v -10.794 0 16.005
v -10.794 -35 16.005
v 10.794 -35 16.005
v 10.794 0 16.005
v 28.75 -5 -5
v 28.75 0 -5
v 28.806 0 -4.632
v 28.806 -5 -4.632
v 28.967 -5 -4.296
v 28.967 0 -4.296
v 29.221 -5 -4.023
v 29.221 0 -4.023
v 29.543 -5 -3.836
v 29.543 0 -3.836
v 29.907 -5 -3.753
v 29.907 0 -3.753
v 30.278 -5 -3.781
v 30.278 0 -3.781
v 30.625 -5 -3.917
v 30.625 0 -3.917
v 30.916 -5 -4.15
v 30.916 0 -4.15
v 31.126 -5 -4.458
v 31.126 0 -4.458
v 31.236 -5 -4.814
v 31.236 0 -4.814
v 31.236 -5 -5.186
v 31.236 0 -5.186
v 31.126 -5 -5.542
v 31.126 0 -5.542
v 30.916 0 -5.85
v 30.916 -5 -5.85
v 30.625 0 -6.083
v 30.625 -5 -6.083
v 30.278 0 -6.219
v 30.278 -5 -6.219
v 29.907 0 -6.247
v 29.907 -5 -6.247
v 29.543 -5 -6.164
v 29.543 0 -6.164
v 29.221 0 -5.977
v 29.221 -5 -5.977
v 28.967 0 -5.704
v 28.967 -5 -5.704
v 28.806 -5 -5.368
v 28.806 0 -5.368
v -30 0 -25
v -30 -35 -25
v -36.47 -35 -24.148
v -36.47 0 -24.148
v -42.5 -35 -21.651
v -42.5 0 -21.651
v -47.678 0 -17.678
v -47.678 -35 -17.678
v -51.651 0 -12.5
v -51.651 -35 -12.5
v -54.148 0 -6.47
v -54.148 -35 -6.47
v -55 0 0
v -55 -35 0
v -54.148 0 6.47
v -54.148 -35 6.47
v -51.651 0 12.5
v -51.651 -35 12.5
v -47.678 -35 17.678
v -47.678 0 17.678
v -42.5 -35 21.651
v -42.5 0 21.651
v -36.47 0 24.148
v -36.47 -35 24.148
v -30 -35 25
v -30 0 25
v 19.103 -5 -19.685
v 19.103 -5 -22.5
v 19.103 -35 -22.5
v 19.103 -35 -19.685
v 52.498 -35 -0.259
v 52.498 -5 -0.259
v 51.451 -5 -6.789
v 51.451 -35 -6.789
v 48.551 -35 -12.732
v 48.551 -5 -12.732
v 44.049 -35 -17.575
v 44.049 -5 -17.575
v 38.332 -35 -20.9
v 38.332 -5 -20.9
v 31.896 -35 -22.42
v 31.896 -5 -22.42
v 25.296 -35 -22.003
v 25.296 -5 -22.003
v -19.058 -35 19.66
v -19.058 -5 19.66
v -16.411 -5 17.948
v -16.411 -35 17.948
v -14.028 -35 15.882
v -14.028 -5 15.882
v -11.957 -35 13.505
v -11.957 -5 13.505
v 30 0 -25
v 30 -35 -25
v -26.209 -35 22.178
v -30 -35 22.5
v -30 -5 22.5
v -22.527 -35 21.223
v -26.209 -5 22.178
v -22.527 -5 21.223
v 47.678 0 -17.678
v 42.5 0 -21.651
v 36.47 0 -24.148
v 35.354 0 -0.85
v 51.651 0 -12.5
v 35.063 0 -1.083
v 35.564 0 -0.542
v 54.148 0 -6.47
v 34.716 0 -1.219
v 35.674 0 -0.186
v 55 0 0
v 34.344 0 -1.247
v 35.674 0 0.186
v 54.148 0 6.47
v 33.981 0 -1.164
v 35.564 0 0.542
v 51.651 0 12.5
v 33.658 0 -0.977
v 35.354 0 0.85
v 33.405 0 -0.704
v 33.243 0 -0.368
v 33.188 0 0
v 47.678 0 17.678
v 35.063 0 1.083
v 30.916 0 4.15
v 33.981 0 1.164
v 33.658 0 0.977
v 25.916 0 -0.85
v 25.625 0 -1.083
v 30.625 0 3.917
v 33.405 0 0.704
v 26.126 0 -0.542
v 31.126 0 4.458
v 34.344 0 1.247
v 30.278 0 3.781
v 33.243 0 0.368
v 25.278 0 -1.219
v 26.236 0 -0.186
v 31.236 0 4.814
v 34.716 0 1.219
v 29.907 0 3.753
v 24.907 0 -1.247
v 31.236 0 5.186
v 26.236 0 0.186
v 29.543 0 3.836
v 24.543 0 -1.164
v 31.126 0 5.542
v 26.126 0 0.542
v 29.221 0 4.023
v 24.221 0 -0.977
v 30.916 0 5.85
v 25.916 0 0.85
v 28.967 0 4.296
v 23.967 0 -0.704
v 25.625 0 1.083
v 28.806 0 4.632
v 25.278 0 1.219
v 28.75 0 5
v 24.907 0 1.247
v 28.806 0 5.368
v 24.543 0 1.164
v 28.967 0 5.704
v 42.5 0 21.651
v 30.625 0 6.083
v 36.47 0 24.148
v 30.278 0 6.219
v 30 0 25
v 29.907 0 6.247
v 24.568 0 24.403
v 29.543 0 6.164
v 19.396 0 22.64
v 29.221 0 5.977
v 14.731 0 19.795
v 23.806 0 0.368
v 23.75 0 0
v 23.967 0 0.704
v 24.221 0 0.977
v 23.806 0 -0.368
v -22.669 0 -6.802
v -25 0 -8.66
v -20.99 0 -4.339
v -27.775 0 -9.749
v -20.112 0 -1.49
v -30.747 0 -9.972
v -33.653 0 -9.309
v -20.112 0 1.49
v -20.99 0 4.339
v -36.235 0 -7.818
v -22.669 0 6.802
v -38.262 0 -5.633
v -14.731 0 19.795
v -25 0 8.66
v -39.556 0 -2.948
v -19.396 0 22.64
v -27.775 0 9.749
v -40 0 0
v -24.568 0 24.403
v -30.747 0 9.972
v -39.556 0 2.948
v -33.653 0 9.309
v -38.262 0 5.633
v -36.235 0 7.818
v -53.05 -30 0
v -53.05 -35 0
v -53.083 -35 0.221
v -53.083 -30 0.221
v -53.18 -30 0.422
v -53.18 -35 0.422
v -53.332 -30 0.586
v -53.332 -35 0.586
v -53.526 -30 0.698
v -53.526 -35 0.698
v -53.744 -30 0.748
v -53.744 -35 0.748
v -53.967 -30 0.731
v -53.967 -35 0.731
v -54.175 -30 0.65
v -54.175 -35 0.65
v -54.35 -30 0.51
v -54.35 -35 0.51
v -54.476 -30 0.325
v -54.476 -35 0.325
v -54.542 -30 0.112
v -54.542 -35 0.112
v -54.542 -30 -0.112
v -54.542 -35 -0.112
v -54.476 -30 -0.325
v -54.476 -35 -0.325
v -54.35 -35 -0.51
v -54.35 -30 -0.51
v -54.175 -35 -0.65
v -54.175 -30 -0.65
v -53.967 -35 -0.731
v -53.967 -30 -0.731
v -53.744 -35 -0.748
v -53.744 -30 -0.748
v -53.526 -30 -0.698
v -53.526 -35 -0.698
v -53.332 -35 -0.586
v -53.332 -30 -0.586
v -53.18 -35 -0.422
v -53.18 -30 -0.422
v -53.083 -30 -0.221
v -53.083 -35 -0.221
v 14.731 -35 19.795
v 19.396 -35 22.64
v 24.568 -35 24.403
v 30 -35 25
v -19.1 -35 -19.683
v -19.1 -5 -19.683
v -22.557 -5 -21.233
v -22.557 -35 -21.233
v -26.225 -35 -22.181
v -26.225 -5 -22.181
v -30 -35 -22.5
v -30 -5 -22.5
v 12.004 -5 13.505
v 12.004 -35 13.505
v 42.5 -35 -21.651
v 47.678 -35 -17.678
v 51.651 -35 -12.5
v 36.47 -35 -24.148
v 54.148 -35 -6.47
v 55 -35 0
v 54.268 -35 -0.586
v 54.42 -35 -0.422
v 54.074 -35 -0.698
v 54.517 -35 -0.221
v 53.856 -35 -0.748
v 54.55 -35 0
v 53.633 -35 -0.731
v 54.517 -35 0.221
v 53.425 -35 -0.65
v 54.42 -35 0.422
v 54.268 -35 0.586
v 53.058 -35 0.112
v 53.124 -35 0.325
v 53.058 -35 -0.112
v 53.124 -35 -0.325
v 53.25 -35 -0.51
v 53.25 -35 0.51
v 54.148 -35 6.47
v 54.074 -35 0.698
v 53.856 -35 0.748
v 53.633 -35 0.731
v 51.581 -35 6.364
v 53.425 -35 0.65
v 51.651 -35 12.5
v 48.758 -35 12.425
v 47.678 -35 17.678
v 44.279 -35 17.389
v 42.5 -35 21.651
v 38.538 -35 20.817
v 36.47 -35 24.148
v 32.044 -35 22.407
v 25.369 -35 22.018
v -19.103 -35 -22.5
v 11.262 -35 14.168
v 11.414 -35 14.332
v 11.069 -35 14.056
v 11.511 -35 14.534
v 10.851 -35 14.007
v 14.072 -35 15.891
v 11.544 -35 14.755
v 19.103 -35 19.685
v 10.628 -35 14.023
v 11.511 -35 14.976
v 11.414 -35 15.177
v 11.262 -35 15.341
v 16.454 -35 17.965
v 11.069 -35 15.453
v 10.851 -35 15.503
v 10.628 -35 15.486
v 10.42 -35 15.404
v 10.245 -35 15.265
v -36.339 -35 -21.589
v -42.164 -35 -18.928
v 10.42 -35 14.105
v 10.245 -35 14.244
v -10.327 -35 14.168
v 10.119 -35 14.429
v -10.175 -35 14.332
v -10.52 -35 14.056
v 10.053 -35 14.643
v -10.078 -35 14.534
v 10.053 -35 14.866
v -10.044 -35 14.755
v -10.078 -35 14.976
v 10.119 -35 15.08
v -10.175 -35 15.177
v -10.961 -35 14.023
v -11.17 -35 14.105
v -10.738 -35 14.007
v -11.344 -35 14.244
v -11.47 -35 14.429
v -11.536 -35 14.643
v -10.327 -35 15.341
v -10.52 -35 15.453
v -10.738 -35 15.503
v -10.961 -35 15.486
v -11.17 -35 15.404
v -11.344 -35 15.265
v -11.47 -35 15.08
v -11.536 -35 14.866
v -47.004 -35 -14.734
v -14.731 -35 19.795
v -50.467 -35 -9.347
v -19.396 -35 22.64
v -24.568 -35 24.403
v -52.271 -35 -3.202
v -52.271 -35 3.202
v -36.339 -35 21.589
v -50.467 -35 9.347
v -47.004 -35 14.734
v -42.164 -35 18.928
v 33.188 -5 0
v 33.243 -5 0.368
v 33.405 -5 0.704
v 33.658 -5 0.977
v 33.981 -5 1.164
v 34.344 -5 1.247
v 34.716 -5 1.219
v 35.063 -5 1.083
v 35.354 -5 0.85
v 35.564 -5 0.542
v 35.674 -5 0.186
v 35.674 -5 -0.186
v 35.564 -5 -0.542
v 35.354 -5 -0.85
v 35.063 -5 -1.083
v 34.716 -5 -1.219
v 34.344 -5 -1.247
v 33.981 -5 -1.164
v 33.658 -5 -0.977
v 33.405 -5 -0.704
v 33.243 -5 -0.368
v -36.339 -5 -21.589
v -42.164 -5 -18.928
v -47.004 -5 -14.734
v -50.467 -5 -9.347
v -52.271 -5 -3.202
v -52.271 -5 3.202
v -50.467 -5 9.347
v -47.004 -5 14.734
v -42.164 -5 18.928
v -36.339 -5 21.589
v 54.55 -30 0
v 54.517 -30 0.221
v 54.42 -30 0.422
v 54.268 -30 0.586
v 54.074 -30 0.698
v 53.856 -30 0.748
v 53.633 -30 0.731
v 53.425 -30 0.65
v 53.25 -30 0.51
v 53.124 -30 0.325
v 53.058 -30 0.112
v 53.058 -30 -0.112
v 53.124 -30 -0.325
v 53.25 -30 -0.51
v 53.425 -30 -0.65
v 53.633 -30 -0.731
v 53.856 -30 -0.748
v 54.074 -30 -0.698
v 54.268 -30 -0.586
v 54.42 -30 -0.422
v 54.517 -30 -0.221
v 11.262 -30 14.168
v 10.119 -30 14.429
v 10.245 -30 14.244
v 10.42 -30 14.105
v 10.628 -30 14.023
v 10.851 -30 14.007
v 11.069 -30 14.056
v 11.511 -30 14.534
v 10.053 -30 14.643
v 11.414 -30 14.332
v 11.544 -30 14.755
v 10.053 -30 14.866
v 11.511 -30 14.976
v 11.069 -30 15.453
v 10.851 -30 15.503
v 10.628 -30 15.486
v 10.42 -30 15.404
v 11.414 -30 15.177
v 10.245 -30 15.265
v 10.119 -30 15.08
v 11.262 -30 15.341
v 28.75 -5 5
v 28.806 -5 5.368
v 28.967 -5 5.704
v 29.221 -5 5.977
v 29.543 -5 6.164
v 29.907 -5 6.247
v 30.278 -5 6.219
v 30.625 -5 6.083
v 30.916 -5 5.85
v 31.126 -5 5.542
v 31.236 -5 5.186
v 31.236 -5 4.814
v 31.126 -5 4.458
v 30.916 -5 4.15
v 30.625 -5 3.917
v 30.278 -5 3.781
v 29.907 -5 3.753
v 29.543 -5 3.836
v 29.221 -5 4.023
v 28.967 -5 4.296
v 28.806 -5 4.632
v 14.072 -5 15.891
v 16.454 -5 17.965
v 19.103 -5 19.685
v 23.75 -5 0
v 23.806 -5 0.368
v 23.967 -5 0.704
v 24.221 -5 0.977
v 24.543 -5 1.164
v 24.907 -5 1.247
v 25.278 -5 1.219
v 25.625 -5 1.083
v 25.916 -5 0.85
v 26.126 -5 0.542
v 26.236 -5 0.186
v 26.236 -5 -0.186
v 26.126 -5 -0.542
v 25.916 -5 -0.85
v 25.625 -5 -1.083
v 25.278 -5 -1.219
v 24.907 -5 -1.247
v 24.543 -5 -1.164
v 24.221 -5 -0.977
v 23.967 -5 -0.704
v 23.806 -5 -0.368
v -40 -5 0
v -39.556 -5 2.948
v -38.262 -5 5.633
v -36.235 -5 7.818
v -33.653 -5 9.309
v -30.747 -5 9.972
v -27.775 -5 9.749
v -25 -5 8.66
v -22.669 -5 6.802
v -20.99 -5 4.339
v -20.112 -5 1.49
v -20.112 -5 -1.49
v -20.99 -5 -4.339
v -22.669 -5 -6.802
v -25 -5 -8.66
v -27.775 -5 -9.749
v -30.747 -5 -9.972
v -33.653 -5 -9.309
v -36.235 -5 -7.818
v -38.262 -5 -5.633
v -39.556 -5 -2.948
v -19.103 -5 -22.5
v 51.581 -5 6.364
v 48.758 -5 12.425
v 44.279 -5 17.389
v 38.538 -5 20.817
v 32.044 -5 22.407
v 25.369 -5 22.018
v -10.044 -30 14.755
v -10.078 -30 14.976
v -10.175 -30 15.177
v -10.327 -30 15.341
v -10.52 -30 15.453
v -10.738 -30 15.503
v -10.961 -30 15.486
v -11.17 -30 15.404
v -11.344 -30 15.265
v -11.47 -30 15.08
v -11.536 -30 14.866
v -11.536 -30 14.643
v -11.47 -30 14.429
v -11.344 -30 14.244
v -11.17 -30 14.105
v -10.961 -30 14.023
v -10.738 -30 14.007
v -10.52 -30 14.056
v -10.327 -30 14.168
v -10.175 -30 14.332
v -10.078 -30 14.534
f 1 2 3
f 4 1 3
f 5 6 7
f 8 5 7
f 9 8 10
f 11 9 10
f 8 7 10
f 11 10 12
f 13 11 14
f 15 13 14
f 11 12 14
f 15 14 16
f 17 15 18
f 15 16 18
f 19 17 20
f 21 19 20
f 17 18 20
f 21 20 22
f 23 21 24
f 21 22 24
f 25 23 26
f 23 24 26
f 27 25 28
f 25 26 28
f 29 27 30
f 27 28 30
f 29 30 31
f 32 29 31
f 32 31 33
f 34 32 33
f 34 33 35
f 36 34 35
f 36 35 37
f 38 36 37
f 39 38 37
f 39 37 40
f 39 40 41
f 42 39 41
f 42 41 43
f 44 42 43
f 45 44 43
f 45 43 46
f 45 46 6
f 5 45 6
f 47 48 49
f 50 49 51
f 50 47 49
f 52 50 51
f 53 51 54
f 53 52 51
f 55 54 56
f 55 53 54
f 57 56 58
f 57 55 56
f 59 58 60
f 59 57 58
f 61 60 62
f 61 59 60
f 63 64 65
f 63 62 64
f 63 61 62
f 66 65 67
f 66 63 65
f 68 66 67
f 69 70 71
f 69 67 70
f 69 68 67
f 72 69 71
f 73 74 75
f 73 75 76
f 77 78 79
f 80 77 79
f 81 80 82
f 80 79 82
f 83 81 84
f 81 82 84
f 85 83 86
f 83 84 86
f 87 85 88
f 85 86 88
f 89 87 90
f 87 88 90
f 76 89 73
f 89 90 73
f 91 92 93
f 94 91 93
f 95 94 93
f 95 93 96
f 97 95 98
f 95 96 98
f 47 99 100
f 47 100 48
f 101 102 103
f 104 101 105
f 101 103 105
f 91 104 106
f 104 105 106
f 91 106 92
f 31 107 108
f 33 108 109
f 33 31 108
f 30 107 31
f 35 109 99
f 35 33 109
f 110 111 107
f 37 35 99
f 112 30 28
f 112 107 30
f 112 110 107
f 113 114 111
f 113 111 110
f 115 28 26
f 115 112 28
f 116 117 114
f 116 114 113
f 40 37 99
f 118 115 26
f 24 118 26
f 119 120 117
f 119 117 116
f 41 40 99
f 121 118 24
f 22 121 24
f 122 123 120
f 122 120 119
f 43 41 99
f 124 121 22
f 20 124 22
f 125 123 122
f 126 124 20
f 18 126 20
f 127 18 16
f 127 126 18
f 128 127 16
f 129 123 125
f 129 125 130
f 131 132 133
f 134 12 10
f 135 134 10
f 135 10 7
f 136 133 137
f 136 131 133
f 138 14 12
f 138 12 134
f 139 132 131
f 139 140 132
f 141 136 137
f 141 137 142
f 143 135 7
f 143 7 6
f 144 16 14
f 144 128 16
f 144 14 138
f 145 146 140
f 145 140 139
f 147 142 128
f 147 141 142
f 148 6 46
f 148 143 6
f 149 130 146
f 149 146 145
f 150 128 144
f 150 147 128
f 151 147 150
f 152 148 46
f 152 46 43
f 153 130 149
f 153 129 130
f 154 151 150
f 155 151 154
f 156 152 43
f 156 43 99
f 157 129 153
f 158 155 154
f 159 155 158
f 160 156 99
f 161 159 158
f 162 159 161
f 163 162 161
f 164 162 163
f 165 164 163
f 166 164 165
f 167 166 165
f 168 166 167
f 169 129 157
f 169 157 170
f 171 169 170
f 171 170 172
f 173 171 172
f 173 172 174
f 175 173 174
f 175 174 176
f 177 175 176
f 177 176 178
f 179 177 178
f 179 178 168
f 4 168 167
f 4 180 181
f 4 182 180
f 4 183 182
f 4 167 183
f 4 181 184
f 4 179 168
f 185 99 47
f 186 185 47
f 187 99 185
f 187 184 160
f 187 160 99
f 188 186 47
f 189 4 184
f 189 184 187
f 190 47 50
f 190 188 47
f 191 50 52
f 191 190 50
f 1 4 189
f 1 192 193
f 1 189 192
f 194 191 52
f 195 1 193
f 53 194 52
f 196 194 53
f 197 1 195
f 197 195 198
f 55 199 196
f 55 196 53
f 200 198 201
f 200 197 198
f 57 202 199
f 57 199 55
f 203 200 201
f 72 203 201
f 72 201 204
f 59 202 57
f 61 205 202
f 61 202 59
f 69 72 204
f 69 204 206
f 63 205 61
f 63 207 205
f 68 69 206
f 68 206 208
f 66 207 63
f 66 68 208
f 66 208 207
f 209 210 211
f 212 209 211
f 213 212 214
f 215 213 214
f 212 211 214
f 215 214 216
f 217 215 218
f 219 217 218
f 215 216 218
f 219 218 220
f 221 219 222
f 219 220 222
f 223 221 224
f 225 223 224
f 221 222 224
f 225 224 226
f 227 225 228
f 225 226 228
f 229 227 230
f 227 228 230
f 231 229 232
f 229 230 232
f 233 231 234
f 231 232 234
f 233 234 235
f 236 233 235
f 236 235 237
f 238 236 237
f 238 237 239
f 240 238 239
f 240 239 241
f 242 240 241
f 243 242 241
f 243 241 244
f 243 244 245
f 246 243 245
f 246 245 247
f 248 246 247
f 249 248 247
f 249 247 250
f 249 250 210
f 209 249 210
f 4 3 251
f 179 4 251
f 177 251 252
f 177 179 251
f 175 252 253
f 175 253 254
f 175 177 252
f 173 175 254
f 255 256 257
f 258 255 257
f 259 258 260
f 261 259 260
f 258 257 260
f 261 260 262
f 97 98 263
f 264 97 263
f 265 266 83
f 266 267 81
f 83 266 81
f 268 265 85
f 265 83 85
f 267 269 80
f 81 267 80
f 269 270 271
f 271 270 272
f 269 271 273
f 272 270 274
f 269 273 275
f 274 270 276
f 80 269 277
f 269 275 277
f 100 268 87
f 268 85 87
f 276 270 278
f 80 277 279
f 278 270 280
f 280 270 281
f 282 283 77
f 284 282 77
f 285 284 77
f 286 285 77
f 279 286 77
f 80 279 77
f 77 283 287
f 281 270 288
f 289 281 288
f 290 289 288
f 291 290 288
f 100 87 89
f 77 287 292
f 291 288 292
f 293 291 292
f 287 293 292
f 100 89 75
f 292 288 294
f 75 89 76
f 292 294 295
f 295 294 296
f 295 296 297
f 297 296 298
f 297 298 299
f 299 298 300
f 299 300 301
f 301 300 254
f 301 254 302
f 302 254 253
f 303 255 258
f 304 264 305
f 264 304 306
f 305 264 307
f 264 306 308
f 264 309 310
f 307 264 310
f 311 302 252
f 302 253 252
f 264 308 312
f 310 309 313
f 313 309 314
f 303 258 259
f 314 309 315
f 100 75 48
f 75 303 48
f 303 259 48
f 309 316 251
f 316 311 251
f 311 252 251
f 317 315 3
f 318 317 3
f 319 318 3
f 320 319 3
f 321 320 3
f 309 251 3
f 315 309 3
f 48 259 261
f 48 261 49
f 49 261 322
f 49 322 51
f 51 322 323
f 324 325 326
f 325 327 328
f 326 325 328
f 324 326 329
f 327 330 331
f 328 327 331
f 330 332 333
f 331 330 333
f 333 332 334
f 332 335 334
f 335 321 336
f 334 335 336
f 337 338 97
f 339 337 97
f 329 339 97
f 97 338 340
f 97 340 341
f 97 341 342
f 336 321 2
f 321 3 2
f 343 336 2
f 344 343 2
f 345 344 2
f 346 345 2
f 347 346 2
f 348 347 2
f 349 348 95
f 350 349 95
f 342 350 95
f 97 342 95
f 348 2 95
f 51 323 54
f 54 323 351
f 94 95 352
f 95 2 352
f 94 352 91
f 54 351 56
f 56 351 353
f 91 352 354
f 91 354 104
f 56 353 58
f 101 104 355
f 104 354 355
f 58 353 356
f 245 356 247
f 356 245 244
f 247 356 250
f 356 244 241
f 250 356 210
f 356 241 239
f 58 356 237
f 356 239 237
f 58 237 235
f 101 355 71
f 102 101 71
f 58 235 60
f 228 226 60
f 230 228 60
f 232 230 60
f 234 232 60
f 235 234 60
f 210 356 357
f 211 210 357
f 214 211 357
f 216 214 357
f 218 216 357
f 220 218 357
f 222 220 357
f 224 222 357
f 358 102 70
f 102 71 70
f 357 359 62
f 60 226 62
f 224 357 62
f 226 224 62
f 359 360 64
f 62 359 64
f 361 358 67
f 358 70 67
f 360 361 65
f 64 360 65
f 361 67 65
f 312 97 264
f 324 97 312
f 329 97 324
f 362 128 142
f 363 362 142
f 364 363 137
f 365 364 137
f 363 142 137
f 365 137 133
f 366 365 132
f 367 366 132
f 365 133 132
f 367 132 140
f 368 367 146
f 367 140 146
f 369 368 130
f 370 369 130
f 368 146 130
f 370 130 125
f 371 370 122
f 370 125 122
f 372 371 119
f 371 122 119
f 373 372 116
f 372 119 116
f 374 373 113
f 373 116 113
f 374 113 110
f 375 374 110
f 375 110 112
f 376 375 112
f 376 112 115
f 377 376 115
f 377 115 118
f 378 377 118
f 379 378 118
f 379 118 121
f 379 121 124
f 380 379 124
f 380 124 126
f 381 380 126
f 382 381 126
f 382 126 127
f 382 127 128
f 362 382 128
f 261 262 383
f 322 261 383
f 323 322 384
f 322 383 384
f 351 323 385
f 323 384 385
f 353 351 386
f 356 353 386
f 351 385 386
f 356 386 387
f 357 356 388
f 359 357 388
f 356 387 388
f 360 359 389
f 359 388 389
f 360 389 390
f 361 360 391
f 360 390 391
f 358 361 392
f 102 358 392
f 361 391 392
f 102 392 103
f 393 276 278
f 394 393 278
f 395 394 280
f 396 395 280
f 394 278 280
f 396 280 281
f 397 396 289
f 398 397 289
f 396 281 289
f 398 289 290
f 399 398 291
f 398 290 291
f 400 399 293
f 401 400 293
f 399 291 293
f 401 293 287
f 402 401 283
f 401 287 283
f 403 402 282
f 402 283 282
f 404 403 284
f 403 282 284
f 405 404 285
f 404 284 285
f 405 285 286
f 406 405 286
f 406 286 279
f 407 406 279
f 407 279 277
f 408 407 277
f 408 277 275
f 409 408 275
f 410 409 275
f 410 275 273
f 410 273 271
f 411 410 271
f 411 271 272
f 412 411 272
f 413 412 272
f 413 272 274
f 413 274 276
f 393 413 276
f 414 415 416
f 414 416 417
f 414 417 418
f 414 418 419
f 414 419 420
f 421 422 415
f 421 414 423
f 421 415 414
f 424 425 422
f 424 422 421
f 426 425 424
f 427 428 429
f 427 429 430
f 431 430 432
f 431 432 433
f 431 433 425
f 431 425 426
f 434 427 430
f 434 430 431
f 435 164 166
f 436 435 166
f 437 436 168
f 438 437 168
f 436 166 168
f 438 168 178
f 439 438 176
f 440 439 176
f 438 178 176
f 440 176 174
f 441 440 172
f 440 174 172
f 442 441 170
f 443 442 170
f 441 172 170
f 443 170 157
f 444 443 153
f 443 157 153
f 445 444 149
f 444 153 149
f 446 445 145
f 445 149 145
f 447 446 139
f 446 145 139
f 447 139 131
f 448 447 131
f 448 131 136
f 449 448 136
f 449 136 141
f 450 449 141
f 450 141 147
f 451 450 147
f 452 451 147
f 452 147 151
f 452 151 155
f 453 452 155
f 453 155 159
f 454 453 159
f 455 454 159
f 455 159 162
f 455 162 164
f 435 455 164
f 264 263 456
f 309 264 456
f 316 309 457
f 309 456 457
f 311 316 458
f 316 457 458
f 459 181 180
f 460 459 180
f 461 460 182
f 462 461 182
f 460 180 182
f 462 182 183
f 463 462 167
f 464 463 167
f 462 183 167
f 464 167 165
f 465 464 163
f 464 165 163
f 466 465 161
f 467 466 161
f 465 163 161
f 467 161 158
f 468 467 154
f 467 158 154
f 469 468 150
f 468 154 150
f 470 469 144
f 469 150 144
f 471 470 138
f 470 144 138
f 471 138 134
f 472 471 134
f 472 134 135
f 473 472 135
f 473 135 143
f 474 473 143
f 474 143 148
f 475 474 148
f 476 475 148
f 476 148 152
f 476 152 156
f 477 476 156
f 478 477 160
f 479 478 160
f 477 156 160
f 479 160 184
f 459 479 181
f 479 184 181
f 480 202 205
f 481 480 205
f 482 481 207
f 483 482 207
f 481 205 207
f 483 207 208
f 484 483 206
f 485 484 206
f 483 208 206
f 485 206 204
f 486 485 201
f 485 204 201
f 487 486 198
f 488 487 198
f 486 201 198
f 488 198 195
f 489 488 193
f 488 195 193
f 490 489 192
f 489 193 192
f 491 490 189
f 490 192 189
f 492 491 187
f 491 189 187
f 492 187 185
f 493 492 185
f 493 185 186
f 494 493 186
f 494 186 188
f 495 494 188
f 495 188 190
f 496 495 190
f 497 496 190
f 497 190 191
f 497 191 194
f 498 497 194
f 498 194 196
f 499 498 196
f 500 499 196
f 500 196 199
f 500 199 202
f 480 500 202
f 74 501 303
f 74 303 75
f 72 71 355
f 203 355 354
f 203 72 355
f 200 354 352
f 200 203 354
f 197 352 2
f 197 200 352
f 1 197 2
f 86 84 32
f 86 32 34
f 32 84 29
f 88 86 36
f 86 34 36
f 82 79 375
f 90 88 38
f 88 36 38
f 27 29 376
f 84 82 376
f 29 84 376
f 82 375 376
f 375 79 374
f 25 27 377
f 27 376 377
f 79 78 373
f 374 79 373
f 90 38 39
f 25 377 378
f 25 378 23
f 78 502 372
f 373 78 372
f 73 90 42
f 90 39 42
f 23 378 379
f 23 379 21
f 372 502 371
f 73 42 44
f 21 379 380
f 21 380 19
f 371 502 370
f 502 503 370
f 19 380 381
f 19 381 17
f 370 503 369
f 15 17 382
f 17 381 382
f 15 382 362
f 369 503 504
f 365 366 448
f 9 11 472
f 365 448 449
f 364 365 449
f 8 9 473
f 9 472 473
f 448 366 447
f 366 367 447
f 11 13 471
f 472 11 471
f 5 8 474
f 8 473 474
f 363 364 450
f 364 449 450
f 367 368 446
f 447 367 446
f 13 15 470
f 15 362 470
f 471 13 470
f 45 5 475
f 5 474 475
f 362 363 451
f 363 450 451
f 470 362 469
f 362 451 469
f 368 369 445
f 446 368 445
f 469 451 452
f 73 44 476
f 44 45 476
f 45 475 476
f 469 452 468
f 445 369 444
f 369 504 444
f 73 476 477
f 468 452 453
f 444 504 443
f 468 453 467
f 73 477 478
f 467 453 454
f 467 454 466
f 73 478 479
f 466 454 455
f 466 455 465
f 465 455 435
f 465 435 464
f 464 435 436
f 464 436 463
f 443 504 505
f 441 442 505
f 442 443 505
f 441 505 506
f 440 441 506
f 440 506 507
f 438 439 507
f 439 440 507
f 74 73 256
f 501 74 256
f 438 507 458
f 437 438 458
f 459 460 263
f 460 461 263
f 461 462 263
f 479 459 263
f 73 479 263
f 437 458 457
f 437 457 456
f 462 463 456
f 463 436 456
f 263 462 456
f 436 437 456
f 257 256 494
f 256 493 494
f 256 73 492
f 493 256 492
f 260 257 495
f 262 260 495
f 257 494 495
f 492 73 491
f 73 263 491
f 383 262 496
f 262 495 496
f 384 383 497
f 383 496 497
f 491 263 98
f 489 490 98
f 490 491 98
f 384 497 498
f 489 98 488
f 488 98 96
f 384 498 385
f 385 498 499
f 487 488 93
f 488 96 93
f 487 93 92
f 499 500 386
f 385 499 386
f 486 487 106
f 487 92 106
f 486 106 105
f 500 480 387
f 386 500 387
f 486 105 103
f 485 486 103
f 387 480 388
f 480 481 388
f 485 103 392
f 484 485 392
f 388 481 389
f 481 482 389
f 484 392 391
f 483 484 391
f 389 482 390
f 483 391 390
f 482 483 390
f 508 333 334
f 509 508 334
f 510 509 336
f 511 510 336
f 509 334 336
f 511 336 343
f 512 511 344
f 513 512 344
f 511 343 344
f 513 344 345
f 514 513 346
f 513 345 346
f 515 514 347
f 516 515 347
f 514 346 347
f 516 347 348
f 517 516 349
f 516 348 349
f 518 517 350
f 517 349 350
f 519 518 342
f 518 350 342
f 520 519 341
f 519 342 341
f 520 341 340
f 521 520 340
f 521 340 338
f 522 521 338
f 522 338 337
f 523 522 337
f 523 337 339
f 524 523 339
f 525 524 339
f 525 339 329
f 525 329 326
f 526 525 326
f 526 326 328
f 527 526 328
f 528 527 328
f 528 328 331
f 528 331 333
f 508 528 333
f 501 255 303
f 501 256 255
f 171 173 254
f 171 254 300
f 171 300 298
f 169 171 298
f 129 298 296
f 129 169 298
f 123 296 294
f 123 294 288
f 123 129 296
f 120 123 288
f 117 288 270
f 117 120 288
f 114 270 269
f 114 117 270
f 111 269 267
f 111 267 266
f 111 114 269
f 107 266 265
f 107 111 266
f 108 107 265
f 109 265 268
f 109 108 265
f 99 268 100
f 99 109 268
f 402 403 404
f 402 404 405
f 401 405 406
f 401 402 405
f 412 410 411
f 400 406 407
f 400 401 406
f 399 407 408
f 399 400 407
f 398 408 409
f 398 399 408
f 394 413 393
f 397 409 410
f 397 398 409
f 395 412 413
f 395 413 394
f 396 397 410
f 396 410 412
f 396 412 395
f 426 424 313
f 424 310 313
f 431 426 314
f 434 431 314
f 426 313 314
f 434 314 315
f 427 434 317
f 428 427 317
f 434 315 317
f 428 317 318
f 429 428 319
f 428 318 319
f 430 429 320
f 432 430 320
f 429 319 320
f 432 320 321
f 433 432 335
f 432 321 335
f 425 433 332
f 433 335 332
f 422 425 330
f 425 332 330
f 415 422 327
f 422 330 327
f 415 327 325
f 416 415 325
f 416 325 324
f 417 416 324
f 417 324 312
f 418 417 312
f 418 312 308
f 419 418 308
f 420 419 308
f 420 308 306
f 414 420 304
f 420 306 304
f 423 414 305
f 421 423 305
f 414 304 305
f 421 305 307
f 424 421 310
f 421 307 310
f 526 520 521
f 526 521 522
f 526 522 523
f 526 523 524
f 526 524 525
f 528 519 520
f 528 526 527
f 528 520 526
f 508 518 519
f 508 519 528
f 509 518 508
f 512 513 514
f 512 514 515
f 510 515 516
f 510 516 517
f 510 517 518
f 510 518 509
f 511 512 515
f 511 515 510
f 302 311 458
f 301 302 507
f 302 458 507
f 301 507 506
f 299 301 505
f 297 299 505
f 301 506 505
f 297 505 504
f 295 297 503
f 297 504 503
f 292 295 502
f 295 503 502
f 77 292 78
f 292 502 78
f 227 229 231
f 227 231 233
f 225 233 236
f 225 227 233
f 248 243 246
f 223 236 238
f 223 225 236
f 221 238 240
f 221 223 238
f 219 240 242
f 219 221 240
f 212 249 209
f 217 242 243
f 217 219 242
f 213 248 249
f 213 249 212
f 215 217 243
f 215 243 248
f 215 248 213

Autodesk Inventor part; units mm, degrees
ref_plane "YZ Plane" through (0, 0, 0) normal (1, 0, 0) x (0, 1, 0)
sketch "Sketch1" plane through (0, 0, 0) normal (0, 1, 0) x (-1, 0, 0)
  line L0 (30, 0) -> (-30, 0) construction
  line L1 (30, 25) -> (-30, 25) construction
  line L2 (-30, -25) -> (30, -25)
  arc A0 (30, -25) -> (30, 25) centre (30, 0) ccw construction
  arc A1 (-30, 25) -> (-30, -25) centre (-30, 0) ccw
  line L3 (30, -25) -> (0, 0) construction
  line L4 (0, 0) -> (30, 25) construction
  line L5 (0, 0) -> (-34.4376, -24.603) construction
  line L6 (0, 0) -> (-34.4376, 25) construction
  line L7 (-34.4376, -24.603) -> (-34.4376, 25) construction
  line L8 (30, -25) -> (30, 25) construction
  line L9 (55, 0) -> (30, -25) construction
  line L10 (55, 0) -> (30, 25) construction
  line L11 (-34.4376, -24.603) -> (-55, 0) construction
  line L12 (-55, 0) -> (-30, 25) construction
  line L13 (25, 0) -> (-25, 0) construction
  line L14 (25, 25) -> (-25, 25) construction
  line L15 (-25, -25) -> (25, -25) construction
  arc A2 (25, -25) -> (25, 25) centre (25, 0) ccw construction
  arc A3 (-25, 25) -> (-25, -25) centre (-25, 0) ccw construction
  line L16 (55, 0) -> (25, -25) construction
  line L17 (55, 0) -> (25, 25) construction
  line L18 (25, -25) -> (25, 25) construction
  line L19 (0, 0) -> (55, 0) construction
  line L20 (-25, -25) -> (-25, 25) construction
  circle A4 centre (-30, 0) radius 25 construction
  circle A5 centre (30, 0) radius 25 construction
  circle A6 centre (-30, 0) radius 22.5 construction
  line L21 (30, -25) -> (-30, -25)
  line L22 (0, -25) -> (0, 25) construction
  line L23 (30, 0) -> (0, 25) construction
  line L24 (10.7945, 16.0046) -> (-10.7945, 16.0046) construction
  line L25 (10.7945, 16.0046) -> (-10.7945, 16.0046)
  line L26 (8.9613, 13.5046) -> (-8.9613, 13.5046)
  circle A7 centre (30, 0) radius 10
  line L27 (19.1028, -22.5) -> (-19.1028, -22.5)
  line L28 (-30, 0) -> (-30, -25) construction
  line L29 (-30, 0) -> (-30, 25) construction
  line L30 (-30, 0) -> (-12.3223, -17.6777) construction
  line L31 (-30, 0) -> (-47.6777, -17.6777) construction
  line L32 (-25, -5) -> (-34.4376, -5) construction
  line L33 (-12.3223, -17.6777) -> (-47.6777, 17.6777) construction
  line L34 (-47.6777, -17.6777) -> (-12.3223, 17.6777) construction
  line L35 (-25, 5) -> (-34.4376, 5) construction
  circle A8 centre (-30, -5) radius 1.25
  circle A9 centre (-25, 0) radius 1.25
  circle A10 centre (-34.4376, 0) radius 1.25
  circle A11 centre (-30, 5) radius 1.25
  line L36 (-19.1028, -22.5) -> (-19.1028, 22.5) construction
  line L37 (19.1028, -22.5) -> (19.0552, 22.4769) construction
  line L38 (10.7945, 16.0046) -> (10.7945, -22.5636) construction
  line L39 (10.7945, 16.0046) -> (49.3627, 16.0046) construction
  line L40 (-10.7945, 16.0046) -> (-10.7945, -22.0758) construction
  line L41 (-10.7945, 16.0046) -> (27.2859, 16.0046) construction
  line L42 (-10.7945, -22.0758) -> (-11.3044, -22.5) construction
  line L43 (-8.9613, 13.5046) -> (-8.9613, -22.5) construction
  line L44 (8.9613, 13.5046) -> (8.9613, -22.5) construction
  arc A12 (19.0998, -19.6834) -> (30, -22.5) centre (30, 0) ccw
  arc A13 (30, -22.5) -> (52.5, 0) centre (30, 0) ccw
  arc A14 (52.5, 0) -> (30, 22.5) centre (30, 0) ccw
  arc A15 (39.375, 20.4538) -> (19.0582, 19.6603) centre (30, 0) ccw
  circle A16 centre (30, 0) radius 22.5369 construction
  arc A17 (19.0582, 19.6603) -> (11.9574, 13.5046) centre (29.9457, -0.0723) ccw
  line L45 (8.9613, 13.5046) -> (11.9574, 13.5046)
  line L46 (19.0998, -19.6834) -> (19.1028, -22.5)
  arc A18 (30, 25) -> (10.7945, 16.0046) centre (30, 0) ccw
  arc A19 (55, 0) -> (30, 25) centre (30, 0) ccw
  arc A20 (30, -25) -> (55, 0) centre (30, 0) ccw
  arc A21 (-52.4985, -0.2589) -> (-19.1028, -19.685) centre (-30, 0) ccw
  arc A22 (-19.1028, 19.685) -> (-52.4985, -0.2589) centre (-30, 0) ccw
  line L47 (-8.9613, 13.5046) -> (-12.0035, 13.5046)
  arc A23 (-12.0035, 13.5046) -> (-19.1028, 19.685) centre (-30, 0) ccw
  line L48 (-19.1028, -22.5) -> (-19.1028, -19.685)
  arc A24 (-10.7945, 16.0046) -> (-30, 25) centre (-30, 0) ccw
  point P0 (-30, 25)
  point P1 (-30, 0)
  dimension "d1" = 30
  dimension "d2" = 50
  dimension "d3" = 50
  dimension "d4" = 25
  dimension "d8" = 110
  dimension "d9" = 50
  dimension "d12" = 45
  dimension "d13" = 0
  dimension "d14" = 2.5
  dimension "d15" = 20
  dimension "d16" = 2.5
  dimension "d25" = 2.5
  dimension "d26" = 2.5
  dimension "d27" = 2.5
  dimension "d28" = 2.5
  dimension "d29" = 90
  dimension "d30" = 90
ref_plane "Work Plane1" through (0, -5, 0) normal (0, -1, 0) x (1, 0, 0)
extrude "Extrusion2" add sketch "Sketch1" against normal blind 35 contours A1 A24 L25 A18 A19 A20 L2
extrude "Extrusion3" add sketch "Sketch1" against normal blind 5 contours L45 A17 A15 A14 A13 A12 L46 L27 L48 A21 A22 A23 L47 L26
sketch "Sketch3" plane through (0, -35, 0) normal (0, -1, 0) x (1, 0, 0)
  point P0 (0, 0)
ref_plane "Work Plane2" through (0, -35, 0) normal (0, -1, 0) x (1, 0, 0)
sketch "Sketch4" plane through (0, -35, 0) normal (0, -1, 0) x (1, 0, 0)
  line L0 (0, 0) -> (-55, 0) construction
  arc A0 (-10.7945, 16.0046) -> (-30, -25) centre (-30, 0) ccw construction
  arc A1 (30, -25) -> (10.7945, 16.0046) centre (30, 0) ccw construction
  line L1 (0, 0) -> (55, 0) construction
  line L2 (-30, -25) -> (-30, 25) construction
  line L3 (30, -25) -> (30, 25) construction
  line L4 (-30, 13.5046) -> (30, 13.5046) construction
  line L5 (-19.1028, -22.5) -> (-19.0998, -19.6834) construction
  line L6 (-19.0998, -19.6834) -> (-30, -19.6834) construction
  arc A2 (-19.0582, 19.6603) -> (-19.0998, -19.6834) centre (-30, 0) ccw construction
  line L7 (-19.0998, -19.6834) -> (30, -19.6834) construction
  circle A3 centre (-53.8, 0) radius 0.75
  circle A4 centre (53.8, 0) radius 0.75
  arc A5 (19.1028, -19.685) -> (12.0035, 13.5046) centre (30, 0) ccw construction
  line L8 (-10.7945, 16.0046) -> (-10.7945, 13.5046) construction
  line L9 (10.7945, 16.0046) -> (10.7945, 13.5046) construction
  circle A6 centre (-10.7945, 14.7546) radius 0.75
  circle A7 centre (10.7945, 14.7546) radius 0.75
  point P0 (-52.5, 0.0238)
  point P1 (-52.5, 0.0238)
  dimension "d41" = 2.5
  dimension "d42" = 1.5
  dimension "d43" = 1.3
  dimension "d44" = 1.5
  dimension "d45" = 0.55
  dimension "d46" = 1.5
  dimension "d47" = 1.5
  dimension "d48" = 20.0889
extrude "Extrusion4" cut sketch "Sketch4" against normal blind 5
properties part number "con_v6_d1_3DPrint"
